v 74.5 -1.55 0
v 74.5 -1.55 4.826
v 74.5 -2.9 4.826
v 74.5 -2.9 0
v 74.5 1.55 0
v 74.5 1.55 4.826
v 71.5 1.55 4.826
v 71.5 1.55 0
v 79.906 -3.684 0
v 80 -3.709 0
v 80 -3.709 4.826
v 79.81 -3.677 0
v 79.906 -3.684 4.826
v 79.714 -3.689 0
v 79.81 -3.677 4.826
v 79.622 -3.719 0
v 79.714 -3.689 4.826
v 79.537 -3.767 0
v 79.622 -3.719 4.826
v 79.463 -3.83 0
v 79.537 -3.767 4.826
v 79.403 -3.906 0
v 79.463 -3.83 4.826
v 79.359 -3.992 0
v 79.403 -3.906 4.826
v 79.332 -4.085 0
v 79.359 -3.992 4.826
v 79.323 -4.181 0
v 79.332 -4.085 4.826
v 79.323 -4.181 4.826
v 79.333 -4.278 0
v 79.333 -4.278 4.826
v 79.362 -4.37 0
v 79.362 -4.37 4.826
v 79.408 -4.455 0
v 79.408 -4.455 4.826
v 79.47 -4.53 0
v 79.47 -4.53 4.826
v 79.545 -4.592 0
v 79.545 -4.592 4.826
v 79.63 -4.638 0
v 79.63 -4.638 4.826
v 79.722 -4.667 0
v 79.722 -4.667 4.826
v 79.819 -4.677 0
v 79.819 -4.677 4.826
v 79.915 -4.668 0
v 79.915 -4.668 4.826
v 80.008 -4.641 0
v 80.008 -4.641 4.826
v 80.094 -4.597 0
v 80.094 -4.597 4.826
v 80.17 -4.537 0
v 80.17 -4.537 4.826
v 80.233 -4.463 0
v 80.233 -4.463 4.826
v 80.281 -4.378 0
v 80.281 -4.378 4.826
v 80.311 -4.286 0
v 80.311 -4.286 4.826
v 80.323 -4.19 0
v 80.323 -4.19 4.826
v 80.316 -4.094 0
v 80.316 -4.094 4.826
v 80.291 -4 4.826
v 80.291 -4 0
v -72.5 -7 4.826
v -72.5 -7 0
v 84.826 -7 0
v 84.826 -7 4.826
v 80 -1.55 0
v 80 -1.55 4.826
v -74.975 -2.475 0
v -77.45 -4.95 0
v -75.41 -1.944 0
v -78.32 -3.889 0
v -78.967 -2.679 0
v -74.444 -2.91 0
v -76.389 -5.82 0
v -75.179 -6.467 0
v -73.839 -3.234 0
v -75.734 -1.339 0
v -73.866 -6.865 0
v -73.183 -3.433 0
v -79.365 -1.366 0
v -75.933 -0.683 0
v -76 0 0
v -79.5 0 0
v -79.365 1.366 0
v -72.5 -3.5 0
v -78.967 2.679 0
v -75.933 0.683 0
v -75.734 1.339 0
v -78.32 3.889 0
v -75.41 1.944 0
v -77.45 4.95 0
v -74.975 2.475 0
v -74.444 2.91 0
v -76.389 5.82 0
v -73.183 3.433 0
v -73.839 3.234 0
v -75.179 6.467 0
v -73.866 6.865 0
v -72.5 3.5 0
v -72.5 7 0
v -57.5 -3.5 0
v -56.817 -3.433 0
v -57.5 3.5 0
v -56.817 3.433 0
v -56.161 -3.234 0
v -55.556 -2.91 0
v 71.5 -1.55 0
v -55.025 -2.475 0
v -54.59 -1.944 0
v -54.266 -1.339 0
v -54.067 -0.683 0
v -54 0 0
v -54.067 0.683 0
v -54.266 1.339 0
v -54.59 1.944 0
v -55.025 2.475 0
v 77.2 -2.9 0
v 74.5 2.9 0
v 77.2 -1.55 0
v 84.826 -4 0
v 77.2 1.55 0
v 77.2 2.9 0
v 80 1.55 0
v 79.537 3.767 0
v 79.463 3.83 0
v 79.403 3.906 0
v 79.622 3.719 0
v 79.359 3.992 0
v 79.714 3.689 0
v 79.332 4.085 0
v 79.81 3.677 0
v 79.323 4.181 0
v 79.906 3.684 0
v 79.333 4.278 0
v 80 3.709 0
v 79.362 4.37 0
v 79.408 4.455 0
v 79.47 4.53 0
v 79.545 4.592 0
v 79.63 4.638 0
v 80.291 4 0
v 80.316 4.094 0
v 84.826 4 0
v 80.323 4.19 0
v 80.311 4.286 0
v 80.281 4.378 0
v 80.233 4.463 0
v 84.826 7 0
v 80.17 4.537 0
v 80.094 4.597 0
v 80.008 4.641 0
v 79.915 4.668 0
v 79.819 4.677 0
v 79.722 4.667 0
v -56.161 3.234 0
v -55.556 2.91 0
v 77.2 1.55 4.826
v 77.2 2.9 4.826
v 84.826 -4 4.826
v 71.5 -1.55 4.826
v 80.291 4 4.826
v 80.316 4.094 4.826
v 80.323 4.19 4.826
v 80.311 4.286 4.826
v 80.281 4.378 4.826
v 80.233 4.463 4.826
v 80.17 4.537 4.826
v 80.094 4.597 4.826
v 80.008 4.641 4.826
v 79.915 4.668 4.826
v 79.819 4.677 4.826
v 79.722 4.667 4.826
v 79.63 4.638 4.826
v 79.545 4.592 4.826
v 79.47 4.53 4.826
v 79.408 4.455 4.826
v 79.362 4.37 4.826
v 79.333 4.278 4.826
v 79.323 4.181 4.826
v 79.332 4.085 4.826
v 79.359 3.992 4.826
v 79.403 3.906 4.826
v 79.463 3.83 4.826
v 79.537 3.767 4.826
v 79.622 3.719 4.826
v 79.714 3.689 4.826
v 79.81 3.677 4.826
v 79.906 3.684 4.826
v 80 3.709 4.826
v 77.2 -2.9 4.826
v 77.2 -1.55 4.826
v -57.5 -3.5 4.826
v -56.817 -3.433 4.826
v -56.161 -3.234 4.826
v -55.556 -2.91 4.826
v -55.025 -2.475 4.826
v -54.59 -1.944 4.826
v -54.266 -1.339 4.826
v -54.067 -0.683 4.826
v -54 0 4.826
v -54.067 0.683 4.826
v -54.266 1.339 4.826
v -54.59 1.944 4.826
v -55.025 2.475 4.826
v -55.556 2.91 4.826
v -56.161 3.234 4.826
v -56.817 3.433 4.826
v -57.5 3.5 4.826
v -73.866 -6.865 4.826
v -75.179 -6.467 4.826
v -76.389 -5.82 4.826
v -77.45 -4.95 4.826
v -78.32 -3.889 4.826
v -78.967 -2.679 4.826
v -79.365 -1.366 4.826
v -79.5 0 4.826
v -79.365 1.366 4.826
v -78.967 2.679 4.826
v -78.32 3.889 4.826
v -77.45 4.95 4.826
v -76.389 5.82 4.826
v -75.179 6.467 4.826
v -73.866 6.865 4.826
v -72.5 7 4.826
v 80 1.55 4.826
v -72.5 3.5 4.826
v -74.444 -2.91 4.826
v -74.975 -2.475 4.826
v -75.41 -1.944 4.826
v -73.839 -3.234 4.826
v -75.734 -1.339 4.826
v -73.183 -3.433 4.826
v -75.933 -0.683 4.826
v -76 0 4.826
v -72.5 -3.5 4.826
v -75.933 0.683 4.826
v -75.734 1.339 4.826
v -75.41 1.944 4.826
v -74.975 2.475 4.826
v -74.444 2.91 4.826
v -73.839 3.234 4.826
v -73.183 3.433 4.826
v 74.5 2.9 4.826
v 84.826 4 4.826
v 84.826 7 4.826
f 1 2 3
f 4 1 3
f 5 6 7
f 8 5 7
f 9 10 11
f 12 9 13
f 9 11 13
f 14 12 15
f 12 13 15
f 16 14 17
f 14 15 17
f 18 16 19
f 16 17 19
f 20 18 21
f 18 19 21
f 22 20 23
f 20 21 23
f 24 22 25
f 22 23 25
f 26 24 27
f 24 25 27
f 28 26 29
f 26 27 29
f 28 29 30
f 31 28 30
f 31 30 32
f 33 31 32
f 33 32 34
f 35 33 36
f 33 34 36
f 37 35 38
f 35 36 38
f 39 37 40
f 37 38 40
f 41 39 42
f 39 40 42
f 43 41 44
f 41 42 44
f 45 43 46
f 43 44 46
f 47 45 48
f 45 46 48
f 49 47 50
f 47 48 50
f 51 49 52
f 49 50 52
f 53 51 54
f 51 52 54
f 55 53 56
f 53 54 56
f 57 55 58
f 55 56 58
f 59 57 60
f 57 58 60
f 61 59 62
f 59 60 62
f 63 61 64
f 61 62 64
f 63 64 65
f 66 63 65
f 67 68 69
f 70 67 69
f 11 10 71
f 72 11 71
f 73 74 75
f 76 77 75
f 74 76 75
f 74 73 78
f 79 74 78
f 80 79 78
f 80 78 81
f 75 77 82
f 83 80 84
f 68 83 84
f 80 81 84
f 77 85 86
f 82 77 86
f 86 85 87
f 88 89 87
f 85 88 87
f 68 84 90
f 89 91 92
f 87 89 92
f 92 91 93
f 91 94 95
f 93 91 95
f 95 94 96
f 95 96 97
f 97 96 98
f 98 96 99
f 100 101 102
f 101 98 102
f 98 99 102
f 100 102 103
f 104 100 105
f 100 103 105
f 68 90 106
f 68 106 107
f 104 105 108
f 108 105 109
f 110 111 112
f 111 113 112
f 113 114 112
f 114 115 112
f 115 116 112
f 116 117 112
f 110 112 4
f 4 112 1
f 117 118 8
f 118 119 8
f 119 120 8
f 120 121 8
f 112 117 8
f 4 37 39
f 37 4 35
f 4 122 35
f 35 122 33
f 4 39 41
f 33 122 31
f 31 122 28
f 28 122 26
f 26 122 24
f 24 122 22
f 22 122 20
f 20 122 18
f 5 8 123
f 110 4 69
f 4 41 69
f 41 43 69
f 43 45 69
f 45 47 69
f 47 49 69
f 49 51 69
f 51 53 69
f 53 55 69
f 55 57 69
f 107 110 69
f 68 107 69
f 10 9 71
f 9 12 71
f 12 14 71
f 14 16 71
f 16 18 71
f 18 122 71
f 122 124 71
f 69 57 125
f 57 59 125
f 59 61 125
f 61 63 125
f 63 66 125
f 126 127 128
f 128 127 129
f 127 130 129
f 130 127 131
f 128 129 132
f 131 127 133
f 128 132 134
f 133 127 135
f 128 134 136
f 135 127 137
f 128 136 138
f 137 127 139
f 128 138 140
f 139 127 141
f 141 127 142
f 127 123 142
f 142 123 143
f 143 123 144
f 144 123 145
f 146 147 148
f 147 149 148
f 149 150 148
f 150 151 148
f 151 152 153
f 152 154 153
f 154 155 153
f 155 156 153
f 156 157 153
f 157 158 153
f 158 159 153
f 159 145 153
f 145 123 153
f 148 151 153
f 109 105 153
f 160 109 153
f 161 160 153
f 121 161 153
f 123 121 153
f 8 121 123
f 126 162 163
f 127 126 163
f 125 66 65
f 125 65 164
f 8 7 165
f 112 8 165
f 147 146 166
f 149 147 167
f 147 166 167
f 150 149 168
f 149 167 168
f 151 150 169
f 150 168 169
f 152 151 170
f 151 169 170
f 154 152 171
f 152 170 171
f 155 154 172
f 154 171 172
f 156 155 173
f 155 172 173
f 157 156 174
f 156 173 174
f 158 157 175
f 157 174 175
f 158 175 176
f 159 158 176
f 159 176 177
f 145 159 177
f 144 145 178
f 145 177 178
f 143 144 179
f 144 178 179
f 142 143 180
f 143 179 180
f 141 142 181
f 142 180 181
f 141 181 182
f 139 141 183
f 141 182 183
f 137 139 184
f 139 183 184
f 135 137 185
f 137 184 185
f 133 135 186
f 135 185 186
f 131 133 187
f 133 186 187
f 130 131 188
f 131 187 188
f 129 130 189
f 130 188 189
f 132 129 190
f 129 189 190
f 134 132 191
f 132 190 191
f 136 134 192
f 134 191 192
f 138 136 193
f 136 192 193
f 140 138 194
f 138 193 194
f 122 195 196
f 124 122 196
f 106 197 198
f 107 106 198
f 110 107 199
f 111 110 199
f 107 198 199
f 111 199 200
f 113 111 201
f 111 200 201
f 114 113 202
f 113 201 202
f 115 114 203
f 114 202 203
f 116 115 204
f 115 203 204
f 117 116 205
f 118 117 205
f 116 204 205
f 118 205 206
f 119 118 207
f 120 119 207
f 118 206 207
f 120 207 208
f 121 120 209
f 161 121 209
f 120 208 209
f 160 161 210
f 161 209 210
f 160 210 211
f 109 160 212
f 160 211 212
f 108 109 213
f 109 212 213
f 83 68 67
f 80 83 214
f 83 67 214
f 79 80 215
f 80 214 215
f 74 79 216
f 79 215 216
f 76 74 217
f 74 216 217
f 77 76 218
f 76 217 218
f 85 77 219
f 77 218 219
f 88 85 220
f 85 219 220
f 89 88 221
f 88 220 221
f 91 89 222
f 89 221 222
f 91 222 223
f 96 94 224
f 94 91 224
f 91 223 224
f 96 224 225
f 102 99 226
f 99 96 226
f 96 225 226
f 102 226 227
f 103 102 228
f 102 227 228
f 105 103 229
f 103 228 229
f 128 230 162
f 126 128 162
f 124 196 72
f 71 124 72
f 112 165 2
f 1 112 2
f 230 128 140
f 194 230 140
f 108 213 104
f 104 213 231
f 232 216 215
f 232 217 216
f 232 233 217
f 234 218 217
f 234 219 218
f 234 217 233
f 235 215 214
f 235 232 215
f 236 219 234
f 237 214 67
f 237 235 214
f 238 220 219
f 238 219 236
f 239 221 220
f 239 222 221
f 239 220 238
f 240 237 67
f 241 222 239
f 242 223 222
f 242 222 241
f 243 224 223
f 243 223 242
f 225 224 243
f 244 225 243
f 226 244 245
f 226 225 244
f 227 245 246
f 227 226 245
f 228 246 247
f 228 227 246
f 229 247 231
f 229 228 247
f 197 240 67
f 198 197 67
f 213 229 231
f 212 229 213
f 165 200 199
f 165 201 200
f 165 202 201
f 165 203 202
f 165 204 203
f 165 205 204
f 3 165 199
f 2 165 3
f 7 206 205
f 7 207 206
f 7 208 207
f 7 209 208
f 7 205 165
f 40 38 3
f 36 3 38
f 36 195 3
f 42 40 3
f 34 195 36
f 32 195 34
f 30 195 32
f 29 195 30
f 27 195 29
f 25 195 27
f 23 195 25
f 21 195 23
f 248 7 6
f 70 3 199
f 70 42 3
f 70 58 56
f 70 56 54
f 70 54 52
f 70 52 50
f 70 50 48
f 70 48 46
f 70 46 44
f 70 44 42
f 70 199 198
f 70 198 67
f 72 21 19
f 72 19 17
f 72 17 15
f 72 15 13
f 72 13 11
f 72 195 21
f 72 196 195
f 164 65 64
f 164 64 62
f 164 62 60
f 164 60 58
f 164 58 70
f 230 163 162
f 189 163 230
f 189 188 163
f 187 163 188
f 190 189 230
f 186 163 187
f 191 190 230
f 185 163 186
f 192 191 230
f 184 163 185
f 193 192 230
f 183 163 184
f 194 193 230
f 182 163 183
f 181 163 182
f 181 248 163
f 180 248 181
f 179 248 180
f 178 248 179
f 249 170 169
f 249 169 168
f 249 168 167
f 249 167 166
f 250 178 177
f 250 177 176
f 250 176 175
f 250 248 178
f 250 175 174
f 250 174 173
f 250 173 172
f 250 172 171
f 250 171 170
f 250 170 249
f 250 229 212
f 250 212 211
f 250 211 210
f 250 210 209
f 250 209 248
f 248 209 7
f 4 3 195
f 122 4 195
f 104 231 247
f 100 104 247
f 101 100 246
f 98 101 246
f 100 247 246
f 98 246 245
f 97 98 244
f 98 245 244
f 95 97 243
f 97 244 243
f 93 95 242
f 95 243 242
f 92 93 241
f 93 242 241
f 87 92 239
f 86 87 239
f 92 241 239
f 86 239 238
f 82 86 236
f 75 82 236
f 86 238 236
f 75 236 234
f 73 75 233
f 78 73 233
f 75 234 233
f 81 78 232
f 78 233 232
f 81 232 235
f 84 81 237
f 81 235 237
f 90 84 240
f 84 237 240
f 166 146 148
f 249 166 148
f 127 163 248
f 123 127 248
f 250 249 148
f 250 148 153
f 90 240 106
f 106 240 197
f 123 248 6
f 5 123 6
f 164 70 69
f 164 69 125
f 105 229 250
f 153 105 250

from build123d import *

# Parameters (mm, degrees)
F0_W      = 160
F0_H      = 14
F1_DEPTH  = 4.826
F2_W      = 4.826
F2_H      = 3
F3_DEPTH  = 4.826
F4_DEPTH  = 25
F5_R      = 0.5
F6_DEPTH  = 4.827
F8_DEPTH  = 4.827
F10_DEPTH = 4.827


with BuildPart() as f1:
    # F0 (on Top) → F1 (new body)
    with BuildSketch(Plane.XY):
        Rectangle(F0_W, F0_H)
    extrude(amount=F1_DEPTH)

    # F2 (on face) → F3 (join, through all)
    with BuildSketch(Plane.XY.offset(4.826)):
        with Locations((82.413, 5.5)):
            Rectangle(F2_W, F2_H)
        with Locations((82.413, -5.5)):
            Rectangle(F2_W, F2_H)
    extrude(amount=-F3_DEPTH)

    # F2 (on face) → F4 (cut)
    with BuildSketch(Plane.XY.offset(4.826)):
        Polygon((80, -1.55), (80, 1.55), (77.2, 1.55), (77.2, 2.9), (74.5, 2.9), (74.5, 1.55), (71.5, 1.55), (71.5, -1.55), (74.5, -1.55), (74.5, -2.9), (77.2, -2.9), (77.2, -1.55), align=None)
    extrude(amount=-F4_DEPTH, mode=Mode.SUBTRACT)

    # F5 (on face) → F6 (cut, through all)
    with BuildSketch(Plane.XY.offset(4.826)):
        with Locations((79.823223, 4.176777)):
            Circle(F5_R)
        with Locations((79.823223, -4.176777)):
            Circle(F5_R)
    extrude(amount=-F6_DEPTH, mode=Mode.SUBTRACT)

    # F7 (on face) → F8 (cut, through all)
    with BuildSketch(Plane.XY.offset(4.826)):
        with BuildLine():
            Line((-57.5, 3.5), (-72.5, 3.5))
            ThreePointArc((-72.5, 3.5), (-76, 0), (-72.5, -3.5))
            Line((-72.5, -3.5), (-57.5, -3.5))
            ThreePointArc((-57.5, -3.5), (-54, 0), (-57.5, 3.5))
        make_face()
    extrude(amount=-F8_DEPTH, mode=Mode.SUBTRACT)

    # F9 (on face) → F10 (cut, through all)
    with BuildSketch(Plane.XY.offset(4.826)):
        with BuildLine():
            ThreePointArc((-72.5, -7), (-79.5, 0), (-72.5, 7))
            Line((-72.5, 7), (-80, 7))
            Line((-80, 7), (-80, -7))
            Line((-80, -7), (-72.5, -7))
        make_face()
    extrude(amount=-F10_DEPTH, mode=Mode.SUBTRACT)


solid = f1.part
